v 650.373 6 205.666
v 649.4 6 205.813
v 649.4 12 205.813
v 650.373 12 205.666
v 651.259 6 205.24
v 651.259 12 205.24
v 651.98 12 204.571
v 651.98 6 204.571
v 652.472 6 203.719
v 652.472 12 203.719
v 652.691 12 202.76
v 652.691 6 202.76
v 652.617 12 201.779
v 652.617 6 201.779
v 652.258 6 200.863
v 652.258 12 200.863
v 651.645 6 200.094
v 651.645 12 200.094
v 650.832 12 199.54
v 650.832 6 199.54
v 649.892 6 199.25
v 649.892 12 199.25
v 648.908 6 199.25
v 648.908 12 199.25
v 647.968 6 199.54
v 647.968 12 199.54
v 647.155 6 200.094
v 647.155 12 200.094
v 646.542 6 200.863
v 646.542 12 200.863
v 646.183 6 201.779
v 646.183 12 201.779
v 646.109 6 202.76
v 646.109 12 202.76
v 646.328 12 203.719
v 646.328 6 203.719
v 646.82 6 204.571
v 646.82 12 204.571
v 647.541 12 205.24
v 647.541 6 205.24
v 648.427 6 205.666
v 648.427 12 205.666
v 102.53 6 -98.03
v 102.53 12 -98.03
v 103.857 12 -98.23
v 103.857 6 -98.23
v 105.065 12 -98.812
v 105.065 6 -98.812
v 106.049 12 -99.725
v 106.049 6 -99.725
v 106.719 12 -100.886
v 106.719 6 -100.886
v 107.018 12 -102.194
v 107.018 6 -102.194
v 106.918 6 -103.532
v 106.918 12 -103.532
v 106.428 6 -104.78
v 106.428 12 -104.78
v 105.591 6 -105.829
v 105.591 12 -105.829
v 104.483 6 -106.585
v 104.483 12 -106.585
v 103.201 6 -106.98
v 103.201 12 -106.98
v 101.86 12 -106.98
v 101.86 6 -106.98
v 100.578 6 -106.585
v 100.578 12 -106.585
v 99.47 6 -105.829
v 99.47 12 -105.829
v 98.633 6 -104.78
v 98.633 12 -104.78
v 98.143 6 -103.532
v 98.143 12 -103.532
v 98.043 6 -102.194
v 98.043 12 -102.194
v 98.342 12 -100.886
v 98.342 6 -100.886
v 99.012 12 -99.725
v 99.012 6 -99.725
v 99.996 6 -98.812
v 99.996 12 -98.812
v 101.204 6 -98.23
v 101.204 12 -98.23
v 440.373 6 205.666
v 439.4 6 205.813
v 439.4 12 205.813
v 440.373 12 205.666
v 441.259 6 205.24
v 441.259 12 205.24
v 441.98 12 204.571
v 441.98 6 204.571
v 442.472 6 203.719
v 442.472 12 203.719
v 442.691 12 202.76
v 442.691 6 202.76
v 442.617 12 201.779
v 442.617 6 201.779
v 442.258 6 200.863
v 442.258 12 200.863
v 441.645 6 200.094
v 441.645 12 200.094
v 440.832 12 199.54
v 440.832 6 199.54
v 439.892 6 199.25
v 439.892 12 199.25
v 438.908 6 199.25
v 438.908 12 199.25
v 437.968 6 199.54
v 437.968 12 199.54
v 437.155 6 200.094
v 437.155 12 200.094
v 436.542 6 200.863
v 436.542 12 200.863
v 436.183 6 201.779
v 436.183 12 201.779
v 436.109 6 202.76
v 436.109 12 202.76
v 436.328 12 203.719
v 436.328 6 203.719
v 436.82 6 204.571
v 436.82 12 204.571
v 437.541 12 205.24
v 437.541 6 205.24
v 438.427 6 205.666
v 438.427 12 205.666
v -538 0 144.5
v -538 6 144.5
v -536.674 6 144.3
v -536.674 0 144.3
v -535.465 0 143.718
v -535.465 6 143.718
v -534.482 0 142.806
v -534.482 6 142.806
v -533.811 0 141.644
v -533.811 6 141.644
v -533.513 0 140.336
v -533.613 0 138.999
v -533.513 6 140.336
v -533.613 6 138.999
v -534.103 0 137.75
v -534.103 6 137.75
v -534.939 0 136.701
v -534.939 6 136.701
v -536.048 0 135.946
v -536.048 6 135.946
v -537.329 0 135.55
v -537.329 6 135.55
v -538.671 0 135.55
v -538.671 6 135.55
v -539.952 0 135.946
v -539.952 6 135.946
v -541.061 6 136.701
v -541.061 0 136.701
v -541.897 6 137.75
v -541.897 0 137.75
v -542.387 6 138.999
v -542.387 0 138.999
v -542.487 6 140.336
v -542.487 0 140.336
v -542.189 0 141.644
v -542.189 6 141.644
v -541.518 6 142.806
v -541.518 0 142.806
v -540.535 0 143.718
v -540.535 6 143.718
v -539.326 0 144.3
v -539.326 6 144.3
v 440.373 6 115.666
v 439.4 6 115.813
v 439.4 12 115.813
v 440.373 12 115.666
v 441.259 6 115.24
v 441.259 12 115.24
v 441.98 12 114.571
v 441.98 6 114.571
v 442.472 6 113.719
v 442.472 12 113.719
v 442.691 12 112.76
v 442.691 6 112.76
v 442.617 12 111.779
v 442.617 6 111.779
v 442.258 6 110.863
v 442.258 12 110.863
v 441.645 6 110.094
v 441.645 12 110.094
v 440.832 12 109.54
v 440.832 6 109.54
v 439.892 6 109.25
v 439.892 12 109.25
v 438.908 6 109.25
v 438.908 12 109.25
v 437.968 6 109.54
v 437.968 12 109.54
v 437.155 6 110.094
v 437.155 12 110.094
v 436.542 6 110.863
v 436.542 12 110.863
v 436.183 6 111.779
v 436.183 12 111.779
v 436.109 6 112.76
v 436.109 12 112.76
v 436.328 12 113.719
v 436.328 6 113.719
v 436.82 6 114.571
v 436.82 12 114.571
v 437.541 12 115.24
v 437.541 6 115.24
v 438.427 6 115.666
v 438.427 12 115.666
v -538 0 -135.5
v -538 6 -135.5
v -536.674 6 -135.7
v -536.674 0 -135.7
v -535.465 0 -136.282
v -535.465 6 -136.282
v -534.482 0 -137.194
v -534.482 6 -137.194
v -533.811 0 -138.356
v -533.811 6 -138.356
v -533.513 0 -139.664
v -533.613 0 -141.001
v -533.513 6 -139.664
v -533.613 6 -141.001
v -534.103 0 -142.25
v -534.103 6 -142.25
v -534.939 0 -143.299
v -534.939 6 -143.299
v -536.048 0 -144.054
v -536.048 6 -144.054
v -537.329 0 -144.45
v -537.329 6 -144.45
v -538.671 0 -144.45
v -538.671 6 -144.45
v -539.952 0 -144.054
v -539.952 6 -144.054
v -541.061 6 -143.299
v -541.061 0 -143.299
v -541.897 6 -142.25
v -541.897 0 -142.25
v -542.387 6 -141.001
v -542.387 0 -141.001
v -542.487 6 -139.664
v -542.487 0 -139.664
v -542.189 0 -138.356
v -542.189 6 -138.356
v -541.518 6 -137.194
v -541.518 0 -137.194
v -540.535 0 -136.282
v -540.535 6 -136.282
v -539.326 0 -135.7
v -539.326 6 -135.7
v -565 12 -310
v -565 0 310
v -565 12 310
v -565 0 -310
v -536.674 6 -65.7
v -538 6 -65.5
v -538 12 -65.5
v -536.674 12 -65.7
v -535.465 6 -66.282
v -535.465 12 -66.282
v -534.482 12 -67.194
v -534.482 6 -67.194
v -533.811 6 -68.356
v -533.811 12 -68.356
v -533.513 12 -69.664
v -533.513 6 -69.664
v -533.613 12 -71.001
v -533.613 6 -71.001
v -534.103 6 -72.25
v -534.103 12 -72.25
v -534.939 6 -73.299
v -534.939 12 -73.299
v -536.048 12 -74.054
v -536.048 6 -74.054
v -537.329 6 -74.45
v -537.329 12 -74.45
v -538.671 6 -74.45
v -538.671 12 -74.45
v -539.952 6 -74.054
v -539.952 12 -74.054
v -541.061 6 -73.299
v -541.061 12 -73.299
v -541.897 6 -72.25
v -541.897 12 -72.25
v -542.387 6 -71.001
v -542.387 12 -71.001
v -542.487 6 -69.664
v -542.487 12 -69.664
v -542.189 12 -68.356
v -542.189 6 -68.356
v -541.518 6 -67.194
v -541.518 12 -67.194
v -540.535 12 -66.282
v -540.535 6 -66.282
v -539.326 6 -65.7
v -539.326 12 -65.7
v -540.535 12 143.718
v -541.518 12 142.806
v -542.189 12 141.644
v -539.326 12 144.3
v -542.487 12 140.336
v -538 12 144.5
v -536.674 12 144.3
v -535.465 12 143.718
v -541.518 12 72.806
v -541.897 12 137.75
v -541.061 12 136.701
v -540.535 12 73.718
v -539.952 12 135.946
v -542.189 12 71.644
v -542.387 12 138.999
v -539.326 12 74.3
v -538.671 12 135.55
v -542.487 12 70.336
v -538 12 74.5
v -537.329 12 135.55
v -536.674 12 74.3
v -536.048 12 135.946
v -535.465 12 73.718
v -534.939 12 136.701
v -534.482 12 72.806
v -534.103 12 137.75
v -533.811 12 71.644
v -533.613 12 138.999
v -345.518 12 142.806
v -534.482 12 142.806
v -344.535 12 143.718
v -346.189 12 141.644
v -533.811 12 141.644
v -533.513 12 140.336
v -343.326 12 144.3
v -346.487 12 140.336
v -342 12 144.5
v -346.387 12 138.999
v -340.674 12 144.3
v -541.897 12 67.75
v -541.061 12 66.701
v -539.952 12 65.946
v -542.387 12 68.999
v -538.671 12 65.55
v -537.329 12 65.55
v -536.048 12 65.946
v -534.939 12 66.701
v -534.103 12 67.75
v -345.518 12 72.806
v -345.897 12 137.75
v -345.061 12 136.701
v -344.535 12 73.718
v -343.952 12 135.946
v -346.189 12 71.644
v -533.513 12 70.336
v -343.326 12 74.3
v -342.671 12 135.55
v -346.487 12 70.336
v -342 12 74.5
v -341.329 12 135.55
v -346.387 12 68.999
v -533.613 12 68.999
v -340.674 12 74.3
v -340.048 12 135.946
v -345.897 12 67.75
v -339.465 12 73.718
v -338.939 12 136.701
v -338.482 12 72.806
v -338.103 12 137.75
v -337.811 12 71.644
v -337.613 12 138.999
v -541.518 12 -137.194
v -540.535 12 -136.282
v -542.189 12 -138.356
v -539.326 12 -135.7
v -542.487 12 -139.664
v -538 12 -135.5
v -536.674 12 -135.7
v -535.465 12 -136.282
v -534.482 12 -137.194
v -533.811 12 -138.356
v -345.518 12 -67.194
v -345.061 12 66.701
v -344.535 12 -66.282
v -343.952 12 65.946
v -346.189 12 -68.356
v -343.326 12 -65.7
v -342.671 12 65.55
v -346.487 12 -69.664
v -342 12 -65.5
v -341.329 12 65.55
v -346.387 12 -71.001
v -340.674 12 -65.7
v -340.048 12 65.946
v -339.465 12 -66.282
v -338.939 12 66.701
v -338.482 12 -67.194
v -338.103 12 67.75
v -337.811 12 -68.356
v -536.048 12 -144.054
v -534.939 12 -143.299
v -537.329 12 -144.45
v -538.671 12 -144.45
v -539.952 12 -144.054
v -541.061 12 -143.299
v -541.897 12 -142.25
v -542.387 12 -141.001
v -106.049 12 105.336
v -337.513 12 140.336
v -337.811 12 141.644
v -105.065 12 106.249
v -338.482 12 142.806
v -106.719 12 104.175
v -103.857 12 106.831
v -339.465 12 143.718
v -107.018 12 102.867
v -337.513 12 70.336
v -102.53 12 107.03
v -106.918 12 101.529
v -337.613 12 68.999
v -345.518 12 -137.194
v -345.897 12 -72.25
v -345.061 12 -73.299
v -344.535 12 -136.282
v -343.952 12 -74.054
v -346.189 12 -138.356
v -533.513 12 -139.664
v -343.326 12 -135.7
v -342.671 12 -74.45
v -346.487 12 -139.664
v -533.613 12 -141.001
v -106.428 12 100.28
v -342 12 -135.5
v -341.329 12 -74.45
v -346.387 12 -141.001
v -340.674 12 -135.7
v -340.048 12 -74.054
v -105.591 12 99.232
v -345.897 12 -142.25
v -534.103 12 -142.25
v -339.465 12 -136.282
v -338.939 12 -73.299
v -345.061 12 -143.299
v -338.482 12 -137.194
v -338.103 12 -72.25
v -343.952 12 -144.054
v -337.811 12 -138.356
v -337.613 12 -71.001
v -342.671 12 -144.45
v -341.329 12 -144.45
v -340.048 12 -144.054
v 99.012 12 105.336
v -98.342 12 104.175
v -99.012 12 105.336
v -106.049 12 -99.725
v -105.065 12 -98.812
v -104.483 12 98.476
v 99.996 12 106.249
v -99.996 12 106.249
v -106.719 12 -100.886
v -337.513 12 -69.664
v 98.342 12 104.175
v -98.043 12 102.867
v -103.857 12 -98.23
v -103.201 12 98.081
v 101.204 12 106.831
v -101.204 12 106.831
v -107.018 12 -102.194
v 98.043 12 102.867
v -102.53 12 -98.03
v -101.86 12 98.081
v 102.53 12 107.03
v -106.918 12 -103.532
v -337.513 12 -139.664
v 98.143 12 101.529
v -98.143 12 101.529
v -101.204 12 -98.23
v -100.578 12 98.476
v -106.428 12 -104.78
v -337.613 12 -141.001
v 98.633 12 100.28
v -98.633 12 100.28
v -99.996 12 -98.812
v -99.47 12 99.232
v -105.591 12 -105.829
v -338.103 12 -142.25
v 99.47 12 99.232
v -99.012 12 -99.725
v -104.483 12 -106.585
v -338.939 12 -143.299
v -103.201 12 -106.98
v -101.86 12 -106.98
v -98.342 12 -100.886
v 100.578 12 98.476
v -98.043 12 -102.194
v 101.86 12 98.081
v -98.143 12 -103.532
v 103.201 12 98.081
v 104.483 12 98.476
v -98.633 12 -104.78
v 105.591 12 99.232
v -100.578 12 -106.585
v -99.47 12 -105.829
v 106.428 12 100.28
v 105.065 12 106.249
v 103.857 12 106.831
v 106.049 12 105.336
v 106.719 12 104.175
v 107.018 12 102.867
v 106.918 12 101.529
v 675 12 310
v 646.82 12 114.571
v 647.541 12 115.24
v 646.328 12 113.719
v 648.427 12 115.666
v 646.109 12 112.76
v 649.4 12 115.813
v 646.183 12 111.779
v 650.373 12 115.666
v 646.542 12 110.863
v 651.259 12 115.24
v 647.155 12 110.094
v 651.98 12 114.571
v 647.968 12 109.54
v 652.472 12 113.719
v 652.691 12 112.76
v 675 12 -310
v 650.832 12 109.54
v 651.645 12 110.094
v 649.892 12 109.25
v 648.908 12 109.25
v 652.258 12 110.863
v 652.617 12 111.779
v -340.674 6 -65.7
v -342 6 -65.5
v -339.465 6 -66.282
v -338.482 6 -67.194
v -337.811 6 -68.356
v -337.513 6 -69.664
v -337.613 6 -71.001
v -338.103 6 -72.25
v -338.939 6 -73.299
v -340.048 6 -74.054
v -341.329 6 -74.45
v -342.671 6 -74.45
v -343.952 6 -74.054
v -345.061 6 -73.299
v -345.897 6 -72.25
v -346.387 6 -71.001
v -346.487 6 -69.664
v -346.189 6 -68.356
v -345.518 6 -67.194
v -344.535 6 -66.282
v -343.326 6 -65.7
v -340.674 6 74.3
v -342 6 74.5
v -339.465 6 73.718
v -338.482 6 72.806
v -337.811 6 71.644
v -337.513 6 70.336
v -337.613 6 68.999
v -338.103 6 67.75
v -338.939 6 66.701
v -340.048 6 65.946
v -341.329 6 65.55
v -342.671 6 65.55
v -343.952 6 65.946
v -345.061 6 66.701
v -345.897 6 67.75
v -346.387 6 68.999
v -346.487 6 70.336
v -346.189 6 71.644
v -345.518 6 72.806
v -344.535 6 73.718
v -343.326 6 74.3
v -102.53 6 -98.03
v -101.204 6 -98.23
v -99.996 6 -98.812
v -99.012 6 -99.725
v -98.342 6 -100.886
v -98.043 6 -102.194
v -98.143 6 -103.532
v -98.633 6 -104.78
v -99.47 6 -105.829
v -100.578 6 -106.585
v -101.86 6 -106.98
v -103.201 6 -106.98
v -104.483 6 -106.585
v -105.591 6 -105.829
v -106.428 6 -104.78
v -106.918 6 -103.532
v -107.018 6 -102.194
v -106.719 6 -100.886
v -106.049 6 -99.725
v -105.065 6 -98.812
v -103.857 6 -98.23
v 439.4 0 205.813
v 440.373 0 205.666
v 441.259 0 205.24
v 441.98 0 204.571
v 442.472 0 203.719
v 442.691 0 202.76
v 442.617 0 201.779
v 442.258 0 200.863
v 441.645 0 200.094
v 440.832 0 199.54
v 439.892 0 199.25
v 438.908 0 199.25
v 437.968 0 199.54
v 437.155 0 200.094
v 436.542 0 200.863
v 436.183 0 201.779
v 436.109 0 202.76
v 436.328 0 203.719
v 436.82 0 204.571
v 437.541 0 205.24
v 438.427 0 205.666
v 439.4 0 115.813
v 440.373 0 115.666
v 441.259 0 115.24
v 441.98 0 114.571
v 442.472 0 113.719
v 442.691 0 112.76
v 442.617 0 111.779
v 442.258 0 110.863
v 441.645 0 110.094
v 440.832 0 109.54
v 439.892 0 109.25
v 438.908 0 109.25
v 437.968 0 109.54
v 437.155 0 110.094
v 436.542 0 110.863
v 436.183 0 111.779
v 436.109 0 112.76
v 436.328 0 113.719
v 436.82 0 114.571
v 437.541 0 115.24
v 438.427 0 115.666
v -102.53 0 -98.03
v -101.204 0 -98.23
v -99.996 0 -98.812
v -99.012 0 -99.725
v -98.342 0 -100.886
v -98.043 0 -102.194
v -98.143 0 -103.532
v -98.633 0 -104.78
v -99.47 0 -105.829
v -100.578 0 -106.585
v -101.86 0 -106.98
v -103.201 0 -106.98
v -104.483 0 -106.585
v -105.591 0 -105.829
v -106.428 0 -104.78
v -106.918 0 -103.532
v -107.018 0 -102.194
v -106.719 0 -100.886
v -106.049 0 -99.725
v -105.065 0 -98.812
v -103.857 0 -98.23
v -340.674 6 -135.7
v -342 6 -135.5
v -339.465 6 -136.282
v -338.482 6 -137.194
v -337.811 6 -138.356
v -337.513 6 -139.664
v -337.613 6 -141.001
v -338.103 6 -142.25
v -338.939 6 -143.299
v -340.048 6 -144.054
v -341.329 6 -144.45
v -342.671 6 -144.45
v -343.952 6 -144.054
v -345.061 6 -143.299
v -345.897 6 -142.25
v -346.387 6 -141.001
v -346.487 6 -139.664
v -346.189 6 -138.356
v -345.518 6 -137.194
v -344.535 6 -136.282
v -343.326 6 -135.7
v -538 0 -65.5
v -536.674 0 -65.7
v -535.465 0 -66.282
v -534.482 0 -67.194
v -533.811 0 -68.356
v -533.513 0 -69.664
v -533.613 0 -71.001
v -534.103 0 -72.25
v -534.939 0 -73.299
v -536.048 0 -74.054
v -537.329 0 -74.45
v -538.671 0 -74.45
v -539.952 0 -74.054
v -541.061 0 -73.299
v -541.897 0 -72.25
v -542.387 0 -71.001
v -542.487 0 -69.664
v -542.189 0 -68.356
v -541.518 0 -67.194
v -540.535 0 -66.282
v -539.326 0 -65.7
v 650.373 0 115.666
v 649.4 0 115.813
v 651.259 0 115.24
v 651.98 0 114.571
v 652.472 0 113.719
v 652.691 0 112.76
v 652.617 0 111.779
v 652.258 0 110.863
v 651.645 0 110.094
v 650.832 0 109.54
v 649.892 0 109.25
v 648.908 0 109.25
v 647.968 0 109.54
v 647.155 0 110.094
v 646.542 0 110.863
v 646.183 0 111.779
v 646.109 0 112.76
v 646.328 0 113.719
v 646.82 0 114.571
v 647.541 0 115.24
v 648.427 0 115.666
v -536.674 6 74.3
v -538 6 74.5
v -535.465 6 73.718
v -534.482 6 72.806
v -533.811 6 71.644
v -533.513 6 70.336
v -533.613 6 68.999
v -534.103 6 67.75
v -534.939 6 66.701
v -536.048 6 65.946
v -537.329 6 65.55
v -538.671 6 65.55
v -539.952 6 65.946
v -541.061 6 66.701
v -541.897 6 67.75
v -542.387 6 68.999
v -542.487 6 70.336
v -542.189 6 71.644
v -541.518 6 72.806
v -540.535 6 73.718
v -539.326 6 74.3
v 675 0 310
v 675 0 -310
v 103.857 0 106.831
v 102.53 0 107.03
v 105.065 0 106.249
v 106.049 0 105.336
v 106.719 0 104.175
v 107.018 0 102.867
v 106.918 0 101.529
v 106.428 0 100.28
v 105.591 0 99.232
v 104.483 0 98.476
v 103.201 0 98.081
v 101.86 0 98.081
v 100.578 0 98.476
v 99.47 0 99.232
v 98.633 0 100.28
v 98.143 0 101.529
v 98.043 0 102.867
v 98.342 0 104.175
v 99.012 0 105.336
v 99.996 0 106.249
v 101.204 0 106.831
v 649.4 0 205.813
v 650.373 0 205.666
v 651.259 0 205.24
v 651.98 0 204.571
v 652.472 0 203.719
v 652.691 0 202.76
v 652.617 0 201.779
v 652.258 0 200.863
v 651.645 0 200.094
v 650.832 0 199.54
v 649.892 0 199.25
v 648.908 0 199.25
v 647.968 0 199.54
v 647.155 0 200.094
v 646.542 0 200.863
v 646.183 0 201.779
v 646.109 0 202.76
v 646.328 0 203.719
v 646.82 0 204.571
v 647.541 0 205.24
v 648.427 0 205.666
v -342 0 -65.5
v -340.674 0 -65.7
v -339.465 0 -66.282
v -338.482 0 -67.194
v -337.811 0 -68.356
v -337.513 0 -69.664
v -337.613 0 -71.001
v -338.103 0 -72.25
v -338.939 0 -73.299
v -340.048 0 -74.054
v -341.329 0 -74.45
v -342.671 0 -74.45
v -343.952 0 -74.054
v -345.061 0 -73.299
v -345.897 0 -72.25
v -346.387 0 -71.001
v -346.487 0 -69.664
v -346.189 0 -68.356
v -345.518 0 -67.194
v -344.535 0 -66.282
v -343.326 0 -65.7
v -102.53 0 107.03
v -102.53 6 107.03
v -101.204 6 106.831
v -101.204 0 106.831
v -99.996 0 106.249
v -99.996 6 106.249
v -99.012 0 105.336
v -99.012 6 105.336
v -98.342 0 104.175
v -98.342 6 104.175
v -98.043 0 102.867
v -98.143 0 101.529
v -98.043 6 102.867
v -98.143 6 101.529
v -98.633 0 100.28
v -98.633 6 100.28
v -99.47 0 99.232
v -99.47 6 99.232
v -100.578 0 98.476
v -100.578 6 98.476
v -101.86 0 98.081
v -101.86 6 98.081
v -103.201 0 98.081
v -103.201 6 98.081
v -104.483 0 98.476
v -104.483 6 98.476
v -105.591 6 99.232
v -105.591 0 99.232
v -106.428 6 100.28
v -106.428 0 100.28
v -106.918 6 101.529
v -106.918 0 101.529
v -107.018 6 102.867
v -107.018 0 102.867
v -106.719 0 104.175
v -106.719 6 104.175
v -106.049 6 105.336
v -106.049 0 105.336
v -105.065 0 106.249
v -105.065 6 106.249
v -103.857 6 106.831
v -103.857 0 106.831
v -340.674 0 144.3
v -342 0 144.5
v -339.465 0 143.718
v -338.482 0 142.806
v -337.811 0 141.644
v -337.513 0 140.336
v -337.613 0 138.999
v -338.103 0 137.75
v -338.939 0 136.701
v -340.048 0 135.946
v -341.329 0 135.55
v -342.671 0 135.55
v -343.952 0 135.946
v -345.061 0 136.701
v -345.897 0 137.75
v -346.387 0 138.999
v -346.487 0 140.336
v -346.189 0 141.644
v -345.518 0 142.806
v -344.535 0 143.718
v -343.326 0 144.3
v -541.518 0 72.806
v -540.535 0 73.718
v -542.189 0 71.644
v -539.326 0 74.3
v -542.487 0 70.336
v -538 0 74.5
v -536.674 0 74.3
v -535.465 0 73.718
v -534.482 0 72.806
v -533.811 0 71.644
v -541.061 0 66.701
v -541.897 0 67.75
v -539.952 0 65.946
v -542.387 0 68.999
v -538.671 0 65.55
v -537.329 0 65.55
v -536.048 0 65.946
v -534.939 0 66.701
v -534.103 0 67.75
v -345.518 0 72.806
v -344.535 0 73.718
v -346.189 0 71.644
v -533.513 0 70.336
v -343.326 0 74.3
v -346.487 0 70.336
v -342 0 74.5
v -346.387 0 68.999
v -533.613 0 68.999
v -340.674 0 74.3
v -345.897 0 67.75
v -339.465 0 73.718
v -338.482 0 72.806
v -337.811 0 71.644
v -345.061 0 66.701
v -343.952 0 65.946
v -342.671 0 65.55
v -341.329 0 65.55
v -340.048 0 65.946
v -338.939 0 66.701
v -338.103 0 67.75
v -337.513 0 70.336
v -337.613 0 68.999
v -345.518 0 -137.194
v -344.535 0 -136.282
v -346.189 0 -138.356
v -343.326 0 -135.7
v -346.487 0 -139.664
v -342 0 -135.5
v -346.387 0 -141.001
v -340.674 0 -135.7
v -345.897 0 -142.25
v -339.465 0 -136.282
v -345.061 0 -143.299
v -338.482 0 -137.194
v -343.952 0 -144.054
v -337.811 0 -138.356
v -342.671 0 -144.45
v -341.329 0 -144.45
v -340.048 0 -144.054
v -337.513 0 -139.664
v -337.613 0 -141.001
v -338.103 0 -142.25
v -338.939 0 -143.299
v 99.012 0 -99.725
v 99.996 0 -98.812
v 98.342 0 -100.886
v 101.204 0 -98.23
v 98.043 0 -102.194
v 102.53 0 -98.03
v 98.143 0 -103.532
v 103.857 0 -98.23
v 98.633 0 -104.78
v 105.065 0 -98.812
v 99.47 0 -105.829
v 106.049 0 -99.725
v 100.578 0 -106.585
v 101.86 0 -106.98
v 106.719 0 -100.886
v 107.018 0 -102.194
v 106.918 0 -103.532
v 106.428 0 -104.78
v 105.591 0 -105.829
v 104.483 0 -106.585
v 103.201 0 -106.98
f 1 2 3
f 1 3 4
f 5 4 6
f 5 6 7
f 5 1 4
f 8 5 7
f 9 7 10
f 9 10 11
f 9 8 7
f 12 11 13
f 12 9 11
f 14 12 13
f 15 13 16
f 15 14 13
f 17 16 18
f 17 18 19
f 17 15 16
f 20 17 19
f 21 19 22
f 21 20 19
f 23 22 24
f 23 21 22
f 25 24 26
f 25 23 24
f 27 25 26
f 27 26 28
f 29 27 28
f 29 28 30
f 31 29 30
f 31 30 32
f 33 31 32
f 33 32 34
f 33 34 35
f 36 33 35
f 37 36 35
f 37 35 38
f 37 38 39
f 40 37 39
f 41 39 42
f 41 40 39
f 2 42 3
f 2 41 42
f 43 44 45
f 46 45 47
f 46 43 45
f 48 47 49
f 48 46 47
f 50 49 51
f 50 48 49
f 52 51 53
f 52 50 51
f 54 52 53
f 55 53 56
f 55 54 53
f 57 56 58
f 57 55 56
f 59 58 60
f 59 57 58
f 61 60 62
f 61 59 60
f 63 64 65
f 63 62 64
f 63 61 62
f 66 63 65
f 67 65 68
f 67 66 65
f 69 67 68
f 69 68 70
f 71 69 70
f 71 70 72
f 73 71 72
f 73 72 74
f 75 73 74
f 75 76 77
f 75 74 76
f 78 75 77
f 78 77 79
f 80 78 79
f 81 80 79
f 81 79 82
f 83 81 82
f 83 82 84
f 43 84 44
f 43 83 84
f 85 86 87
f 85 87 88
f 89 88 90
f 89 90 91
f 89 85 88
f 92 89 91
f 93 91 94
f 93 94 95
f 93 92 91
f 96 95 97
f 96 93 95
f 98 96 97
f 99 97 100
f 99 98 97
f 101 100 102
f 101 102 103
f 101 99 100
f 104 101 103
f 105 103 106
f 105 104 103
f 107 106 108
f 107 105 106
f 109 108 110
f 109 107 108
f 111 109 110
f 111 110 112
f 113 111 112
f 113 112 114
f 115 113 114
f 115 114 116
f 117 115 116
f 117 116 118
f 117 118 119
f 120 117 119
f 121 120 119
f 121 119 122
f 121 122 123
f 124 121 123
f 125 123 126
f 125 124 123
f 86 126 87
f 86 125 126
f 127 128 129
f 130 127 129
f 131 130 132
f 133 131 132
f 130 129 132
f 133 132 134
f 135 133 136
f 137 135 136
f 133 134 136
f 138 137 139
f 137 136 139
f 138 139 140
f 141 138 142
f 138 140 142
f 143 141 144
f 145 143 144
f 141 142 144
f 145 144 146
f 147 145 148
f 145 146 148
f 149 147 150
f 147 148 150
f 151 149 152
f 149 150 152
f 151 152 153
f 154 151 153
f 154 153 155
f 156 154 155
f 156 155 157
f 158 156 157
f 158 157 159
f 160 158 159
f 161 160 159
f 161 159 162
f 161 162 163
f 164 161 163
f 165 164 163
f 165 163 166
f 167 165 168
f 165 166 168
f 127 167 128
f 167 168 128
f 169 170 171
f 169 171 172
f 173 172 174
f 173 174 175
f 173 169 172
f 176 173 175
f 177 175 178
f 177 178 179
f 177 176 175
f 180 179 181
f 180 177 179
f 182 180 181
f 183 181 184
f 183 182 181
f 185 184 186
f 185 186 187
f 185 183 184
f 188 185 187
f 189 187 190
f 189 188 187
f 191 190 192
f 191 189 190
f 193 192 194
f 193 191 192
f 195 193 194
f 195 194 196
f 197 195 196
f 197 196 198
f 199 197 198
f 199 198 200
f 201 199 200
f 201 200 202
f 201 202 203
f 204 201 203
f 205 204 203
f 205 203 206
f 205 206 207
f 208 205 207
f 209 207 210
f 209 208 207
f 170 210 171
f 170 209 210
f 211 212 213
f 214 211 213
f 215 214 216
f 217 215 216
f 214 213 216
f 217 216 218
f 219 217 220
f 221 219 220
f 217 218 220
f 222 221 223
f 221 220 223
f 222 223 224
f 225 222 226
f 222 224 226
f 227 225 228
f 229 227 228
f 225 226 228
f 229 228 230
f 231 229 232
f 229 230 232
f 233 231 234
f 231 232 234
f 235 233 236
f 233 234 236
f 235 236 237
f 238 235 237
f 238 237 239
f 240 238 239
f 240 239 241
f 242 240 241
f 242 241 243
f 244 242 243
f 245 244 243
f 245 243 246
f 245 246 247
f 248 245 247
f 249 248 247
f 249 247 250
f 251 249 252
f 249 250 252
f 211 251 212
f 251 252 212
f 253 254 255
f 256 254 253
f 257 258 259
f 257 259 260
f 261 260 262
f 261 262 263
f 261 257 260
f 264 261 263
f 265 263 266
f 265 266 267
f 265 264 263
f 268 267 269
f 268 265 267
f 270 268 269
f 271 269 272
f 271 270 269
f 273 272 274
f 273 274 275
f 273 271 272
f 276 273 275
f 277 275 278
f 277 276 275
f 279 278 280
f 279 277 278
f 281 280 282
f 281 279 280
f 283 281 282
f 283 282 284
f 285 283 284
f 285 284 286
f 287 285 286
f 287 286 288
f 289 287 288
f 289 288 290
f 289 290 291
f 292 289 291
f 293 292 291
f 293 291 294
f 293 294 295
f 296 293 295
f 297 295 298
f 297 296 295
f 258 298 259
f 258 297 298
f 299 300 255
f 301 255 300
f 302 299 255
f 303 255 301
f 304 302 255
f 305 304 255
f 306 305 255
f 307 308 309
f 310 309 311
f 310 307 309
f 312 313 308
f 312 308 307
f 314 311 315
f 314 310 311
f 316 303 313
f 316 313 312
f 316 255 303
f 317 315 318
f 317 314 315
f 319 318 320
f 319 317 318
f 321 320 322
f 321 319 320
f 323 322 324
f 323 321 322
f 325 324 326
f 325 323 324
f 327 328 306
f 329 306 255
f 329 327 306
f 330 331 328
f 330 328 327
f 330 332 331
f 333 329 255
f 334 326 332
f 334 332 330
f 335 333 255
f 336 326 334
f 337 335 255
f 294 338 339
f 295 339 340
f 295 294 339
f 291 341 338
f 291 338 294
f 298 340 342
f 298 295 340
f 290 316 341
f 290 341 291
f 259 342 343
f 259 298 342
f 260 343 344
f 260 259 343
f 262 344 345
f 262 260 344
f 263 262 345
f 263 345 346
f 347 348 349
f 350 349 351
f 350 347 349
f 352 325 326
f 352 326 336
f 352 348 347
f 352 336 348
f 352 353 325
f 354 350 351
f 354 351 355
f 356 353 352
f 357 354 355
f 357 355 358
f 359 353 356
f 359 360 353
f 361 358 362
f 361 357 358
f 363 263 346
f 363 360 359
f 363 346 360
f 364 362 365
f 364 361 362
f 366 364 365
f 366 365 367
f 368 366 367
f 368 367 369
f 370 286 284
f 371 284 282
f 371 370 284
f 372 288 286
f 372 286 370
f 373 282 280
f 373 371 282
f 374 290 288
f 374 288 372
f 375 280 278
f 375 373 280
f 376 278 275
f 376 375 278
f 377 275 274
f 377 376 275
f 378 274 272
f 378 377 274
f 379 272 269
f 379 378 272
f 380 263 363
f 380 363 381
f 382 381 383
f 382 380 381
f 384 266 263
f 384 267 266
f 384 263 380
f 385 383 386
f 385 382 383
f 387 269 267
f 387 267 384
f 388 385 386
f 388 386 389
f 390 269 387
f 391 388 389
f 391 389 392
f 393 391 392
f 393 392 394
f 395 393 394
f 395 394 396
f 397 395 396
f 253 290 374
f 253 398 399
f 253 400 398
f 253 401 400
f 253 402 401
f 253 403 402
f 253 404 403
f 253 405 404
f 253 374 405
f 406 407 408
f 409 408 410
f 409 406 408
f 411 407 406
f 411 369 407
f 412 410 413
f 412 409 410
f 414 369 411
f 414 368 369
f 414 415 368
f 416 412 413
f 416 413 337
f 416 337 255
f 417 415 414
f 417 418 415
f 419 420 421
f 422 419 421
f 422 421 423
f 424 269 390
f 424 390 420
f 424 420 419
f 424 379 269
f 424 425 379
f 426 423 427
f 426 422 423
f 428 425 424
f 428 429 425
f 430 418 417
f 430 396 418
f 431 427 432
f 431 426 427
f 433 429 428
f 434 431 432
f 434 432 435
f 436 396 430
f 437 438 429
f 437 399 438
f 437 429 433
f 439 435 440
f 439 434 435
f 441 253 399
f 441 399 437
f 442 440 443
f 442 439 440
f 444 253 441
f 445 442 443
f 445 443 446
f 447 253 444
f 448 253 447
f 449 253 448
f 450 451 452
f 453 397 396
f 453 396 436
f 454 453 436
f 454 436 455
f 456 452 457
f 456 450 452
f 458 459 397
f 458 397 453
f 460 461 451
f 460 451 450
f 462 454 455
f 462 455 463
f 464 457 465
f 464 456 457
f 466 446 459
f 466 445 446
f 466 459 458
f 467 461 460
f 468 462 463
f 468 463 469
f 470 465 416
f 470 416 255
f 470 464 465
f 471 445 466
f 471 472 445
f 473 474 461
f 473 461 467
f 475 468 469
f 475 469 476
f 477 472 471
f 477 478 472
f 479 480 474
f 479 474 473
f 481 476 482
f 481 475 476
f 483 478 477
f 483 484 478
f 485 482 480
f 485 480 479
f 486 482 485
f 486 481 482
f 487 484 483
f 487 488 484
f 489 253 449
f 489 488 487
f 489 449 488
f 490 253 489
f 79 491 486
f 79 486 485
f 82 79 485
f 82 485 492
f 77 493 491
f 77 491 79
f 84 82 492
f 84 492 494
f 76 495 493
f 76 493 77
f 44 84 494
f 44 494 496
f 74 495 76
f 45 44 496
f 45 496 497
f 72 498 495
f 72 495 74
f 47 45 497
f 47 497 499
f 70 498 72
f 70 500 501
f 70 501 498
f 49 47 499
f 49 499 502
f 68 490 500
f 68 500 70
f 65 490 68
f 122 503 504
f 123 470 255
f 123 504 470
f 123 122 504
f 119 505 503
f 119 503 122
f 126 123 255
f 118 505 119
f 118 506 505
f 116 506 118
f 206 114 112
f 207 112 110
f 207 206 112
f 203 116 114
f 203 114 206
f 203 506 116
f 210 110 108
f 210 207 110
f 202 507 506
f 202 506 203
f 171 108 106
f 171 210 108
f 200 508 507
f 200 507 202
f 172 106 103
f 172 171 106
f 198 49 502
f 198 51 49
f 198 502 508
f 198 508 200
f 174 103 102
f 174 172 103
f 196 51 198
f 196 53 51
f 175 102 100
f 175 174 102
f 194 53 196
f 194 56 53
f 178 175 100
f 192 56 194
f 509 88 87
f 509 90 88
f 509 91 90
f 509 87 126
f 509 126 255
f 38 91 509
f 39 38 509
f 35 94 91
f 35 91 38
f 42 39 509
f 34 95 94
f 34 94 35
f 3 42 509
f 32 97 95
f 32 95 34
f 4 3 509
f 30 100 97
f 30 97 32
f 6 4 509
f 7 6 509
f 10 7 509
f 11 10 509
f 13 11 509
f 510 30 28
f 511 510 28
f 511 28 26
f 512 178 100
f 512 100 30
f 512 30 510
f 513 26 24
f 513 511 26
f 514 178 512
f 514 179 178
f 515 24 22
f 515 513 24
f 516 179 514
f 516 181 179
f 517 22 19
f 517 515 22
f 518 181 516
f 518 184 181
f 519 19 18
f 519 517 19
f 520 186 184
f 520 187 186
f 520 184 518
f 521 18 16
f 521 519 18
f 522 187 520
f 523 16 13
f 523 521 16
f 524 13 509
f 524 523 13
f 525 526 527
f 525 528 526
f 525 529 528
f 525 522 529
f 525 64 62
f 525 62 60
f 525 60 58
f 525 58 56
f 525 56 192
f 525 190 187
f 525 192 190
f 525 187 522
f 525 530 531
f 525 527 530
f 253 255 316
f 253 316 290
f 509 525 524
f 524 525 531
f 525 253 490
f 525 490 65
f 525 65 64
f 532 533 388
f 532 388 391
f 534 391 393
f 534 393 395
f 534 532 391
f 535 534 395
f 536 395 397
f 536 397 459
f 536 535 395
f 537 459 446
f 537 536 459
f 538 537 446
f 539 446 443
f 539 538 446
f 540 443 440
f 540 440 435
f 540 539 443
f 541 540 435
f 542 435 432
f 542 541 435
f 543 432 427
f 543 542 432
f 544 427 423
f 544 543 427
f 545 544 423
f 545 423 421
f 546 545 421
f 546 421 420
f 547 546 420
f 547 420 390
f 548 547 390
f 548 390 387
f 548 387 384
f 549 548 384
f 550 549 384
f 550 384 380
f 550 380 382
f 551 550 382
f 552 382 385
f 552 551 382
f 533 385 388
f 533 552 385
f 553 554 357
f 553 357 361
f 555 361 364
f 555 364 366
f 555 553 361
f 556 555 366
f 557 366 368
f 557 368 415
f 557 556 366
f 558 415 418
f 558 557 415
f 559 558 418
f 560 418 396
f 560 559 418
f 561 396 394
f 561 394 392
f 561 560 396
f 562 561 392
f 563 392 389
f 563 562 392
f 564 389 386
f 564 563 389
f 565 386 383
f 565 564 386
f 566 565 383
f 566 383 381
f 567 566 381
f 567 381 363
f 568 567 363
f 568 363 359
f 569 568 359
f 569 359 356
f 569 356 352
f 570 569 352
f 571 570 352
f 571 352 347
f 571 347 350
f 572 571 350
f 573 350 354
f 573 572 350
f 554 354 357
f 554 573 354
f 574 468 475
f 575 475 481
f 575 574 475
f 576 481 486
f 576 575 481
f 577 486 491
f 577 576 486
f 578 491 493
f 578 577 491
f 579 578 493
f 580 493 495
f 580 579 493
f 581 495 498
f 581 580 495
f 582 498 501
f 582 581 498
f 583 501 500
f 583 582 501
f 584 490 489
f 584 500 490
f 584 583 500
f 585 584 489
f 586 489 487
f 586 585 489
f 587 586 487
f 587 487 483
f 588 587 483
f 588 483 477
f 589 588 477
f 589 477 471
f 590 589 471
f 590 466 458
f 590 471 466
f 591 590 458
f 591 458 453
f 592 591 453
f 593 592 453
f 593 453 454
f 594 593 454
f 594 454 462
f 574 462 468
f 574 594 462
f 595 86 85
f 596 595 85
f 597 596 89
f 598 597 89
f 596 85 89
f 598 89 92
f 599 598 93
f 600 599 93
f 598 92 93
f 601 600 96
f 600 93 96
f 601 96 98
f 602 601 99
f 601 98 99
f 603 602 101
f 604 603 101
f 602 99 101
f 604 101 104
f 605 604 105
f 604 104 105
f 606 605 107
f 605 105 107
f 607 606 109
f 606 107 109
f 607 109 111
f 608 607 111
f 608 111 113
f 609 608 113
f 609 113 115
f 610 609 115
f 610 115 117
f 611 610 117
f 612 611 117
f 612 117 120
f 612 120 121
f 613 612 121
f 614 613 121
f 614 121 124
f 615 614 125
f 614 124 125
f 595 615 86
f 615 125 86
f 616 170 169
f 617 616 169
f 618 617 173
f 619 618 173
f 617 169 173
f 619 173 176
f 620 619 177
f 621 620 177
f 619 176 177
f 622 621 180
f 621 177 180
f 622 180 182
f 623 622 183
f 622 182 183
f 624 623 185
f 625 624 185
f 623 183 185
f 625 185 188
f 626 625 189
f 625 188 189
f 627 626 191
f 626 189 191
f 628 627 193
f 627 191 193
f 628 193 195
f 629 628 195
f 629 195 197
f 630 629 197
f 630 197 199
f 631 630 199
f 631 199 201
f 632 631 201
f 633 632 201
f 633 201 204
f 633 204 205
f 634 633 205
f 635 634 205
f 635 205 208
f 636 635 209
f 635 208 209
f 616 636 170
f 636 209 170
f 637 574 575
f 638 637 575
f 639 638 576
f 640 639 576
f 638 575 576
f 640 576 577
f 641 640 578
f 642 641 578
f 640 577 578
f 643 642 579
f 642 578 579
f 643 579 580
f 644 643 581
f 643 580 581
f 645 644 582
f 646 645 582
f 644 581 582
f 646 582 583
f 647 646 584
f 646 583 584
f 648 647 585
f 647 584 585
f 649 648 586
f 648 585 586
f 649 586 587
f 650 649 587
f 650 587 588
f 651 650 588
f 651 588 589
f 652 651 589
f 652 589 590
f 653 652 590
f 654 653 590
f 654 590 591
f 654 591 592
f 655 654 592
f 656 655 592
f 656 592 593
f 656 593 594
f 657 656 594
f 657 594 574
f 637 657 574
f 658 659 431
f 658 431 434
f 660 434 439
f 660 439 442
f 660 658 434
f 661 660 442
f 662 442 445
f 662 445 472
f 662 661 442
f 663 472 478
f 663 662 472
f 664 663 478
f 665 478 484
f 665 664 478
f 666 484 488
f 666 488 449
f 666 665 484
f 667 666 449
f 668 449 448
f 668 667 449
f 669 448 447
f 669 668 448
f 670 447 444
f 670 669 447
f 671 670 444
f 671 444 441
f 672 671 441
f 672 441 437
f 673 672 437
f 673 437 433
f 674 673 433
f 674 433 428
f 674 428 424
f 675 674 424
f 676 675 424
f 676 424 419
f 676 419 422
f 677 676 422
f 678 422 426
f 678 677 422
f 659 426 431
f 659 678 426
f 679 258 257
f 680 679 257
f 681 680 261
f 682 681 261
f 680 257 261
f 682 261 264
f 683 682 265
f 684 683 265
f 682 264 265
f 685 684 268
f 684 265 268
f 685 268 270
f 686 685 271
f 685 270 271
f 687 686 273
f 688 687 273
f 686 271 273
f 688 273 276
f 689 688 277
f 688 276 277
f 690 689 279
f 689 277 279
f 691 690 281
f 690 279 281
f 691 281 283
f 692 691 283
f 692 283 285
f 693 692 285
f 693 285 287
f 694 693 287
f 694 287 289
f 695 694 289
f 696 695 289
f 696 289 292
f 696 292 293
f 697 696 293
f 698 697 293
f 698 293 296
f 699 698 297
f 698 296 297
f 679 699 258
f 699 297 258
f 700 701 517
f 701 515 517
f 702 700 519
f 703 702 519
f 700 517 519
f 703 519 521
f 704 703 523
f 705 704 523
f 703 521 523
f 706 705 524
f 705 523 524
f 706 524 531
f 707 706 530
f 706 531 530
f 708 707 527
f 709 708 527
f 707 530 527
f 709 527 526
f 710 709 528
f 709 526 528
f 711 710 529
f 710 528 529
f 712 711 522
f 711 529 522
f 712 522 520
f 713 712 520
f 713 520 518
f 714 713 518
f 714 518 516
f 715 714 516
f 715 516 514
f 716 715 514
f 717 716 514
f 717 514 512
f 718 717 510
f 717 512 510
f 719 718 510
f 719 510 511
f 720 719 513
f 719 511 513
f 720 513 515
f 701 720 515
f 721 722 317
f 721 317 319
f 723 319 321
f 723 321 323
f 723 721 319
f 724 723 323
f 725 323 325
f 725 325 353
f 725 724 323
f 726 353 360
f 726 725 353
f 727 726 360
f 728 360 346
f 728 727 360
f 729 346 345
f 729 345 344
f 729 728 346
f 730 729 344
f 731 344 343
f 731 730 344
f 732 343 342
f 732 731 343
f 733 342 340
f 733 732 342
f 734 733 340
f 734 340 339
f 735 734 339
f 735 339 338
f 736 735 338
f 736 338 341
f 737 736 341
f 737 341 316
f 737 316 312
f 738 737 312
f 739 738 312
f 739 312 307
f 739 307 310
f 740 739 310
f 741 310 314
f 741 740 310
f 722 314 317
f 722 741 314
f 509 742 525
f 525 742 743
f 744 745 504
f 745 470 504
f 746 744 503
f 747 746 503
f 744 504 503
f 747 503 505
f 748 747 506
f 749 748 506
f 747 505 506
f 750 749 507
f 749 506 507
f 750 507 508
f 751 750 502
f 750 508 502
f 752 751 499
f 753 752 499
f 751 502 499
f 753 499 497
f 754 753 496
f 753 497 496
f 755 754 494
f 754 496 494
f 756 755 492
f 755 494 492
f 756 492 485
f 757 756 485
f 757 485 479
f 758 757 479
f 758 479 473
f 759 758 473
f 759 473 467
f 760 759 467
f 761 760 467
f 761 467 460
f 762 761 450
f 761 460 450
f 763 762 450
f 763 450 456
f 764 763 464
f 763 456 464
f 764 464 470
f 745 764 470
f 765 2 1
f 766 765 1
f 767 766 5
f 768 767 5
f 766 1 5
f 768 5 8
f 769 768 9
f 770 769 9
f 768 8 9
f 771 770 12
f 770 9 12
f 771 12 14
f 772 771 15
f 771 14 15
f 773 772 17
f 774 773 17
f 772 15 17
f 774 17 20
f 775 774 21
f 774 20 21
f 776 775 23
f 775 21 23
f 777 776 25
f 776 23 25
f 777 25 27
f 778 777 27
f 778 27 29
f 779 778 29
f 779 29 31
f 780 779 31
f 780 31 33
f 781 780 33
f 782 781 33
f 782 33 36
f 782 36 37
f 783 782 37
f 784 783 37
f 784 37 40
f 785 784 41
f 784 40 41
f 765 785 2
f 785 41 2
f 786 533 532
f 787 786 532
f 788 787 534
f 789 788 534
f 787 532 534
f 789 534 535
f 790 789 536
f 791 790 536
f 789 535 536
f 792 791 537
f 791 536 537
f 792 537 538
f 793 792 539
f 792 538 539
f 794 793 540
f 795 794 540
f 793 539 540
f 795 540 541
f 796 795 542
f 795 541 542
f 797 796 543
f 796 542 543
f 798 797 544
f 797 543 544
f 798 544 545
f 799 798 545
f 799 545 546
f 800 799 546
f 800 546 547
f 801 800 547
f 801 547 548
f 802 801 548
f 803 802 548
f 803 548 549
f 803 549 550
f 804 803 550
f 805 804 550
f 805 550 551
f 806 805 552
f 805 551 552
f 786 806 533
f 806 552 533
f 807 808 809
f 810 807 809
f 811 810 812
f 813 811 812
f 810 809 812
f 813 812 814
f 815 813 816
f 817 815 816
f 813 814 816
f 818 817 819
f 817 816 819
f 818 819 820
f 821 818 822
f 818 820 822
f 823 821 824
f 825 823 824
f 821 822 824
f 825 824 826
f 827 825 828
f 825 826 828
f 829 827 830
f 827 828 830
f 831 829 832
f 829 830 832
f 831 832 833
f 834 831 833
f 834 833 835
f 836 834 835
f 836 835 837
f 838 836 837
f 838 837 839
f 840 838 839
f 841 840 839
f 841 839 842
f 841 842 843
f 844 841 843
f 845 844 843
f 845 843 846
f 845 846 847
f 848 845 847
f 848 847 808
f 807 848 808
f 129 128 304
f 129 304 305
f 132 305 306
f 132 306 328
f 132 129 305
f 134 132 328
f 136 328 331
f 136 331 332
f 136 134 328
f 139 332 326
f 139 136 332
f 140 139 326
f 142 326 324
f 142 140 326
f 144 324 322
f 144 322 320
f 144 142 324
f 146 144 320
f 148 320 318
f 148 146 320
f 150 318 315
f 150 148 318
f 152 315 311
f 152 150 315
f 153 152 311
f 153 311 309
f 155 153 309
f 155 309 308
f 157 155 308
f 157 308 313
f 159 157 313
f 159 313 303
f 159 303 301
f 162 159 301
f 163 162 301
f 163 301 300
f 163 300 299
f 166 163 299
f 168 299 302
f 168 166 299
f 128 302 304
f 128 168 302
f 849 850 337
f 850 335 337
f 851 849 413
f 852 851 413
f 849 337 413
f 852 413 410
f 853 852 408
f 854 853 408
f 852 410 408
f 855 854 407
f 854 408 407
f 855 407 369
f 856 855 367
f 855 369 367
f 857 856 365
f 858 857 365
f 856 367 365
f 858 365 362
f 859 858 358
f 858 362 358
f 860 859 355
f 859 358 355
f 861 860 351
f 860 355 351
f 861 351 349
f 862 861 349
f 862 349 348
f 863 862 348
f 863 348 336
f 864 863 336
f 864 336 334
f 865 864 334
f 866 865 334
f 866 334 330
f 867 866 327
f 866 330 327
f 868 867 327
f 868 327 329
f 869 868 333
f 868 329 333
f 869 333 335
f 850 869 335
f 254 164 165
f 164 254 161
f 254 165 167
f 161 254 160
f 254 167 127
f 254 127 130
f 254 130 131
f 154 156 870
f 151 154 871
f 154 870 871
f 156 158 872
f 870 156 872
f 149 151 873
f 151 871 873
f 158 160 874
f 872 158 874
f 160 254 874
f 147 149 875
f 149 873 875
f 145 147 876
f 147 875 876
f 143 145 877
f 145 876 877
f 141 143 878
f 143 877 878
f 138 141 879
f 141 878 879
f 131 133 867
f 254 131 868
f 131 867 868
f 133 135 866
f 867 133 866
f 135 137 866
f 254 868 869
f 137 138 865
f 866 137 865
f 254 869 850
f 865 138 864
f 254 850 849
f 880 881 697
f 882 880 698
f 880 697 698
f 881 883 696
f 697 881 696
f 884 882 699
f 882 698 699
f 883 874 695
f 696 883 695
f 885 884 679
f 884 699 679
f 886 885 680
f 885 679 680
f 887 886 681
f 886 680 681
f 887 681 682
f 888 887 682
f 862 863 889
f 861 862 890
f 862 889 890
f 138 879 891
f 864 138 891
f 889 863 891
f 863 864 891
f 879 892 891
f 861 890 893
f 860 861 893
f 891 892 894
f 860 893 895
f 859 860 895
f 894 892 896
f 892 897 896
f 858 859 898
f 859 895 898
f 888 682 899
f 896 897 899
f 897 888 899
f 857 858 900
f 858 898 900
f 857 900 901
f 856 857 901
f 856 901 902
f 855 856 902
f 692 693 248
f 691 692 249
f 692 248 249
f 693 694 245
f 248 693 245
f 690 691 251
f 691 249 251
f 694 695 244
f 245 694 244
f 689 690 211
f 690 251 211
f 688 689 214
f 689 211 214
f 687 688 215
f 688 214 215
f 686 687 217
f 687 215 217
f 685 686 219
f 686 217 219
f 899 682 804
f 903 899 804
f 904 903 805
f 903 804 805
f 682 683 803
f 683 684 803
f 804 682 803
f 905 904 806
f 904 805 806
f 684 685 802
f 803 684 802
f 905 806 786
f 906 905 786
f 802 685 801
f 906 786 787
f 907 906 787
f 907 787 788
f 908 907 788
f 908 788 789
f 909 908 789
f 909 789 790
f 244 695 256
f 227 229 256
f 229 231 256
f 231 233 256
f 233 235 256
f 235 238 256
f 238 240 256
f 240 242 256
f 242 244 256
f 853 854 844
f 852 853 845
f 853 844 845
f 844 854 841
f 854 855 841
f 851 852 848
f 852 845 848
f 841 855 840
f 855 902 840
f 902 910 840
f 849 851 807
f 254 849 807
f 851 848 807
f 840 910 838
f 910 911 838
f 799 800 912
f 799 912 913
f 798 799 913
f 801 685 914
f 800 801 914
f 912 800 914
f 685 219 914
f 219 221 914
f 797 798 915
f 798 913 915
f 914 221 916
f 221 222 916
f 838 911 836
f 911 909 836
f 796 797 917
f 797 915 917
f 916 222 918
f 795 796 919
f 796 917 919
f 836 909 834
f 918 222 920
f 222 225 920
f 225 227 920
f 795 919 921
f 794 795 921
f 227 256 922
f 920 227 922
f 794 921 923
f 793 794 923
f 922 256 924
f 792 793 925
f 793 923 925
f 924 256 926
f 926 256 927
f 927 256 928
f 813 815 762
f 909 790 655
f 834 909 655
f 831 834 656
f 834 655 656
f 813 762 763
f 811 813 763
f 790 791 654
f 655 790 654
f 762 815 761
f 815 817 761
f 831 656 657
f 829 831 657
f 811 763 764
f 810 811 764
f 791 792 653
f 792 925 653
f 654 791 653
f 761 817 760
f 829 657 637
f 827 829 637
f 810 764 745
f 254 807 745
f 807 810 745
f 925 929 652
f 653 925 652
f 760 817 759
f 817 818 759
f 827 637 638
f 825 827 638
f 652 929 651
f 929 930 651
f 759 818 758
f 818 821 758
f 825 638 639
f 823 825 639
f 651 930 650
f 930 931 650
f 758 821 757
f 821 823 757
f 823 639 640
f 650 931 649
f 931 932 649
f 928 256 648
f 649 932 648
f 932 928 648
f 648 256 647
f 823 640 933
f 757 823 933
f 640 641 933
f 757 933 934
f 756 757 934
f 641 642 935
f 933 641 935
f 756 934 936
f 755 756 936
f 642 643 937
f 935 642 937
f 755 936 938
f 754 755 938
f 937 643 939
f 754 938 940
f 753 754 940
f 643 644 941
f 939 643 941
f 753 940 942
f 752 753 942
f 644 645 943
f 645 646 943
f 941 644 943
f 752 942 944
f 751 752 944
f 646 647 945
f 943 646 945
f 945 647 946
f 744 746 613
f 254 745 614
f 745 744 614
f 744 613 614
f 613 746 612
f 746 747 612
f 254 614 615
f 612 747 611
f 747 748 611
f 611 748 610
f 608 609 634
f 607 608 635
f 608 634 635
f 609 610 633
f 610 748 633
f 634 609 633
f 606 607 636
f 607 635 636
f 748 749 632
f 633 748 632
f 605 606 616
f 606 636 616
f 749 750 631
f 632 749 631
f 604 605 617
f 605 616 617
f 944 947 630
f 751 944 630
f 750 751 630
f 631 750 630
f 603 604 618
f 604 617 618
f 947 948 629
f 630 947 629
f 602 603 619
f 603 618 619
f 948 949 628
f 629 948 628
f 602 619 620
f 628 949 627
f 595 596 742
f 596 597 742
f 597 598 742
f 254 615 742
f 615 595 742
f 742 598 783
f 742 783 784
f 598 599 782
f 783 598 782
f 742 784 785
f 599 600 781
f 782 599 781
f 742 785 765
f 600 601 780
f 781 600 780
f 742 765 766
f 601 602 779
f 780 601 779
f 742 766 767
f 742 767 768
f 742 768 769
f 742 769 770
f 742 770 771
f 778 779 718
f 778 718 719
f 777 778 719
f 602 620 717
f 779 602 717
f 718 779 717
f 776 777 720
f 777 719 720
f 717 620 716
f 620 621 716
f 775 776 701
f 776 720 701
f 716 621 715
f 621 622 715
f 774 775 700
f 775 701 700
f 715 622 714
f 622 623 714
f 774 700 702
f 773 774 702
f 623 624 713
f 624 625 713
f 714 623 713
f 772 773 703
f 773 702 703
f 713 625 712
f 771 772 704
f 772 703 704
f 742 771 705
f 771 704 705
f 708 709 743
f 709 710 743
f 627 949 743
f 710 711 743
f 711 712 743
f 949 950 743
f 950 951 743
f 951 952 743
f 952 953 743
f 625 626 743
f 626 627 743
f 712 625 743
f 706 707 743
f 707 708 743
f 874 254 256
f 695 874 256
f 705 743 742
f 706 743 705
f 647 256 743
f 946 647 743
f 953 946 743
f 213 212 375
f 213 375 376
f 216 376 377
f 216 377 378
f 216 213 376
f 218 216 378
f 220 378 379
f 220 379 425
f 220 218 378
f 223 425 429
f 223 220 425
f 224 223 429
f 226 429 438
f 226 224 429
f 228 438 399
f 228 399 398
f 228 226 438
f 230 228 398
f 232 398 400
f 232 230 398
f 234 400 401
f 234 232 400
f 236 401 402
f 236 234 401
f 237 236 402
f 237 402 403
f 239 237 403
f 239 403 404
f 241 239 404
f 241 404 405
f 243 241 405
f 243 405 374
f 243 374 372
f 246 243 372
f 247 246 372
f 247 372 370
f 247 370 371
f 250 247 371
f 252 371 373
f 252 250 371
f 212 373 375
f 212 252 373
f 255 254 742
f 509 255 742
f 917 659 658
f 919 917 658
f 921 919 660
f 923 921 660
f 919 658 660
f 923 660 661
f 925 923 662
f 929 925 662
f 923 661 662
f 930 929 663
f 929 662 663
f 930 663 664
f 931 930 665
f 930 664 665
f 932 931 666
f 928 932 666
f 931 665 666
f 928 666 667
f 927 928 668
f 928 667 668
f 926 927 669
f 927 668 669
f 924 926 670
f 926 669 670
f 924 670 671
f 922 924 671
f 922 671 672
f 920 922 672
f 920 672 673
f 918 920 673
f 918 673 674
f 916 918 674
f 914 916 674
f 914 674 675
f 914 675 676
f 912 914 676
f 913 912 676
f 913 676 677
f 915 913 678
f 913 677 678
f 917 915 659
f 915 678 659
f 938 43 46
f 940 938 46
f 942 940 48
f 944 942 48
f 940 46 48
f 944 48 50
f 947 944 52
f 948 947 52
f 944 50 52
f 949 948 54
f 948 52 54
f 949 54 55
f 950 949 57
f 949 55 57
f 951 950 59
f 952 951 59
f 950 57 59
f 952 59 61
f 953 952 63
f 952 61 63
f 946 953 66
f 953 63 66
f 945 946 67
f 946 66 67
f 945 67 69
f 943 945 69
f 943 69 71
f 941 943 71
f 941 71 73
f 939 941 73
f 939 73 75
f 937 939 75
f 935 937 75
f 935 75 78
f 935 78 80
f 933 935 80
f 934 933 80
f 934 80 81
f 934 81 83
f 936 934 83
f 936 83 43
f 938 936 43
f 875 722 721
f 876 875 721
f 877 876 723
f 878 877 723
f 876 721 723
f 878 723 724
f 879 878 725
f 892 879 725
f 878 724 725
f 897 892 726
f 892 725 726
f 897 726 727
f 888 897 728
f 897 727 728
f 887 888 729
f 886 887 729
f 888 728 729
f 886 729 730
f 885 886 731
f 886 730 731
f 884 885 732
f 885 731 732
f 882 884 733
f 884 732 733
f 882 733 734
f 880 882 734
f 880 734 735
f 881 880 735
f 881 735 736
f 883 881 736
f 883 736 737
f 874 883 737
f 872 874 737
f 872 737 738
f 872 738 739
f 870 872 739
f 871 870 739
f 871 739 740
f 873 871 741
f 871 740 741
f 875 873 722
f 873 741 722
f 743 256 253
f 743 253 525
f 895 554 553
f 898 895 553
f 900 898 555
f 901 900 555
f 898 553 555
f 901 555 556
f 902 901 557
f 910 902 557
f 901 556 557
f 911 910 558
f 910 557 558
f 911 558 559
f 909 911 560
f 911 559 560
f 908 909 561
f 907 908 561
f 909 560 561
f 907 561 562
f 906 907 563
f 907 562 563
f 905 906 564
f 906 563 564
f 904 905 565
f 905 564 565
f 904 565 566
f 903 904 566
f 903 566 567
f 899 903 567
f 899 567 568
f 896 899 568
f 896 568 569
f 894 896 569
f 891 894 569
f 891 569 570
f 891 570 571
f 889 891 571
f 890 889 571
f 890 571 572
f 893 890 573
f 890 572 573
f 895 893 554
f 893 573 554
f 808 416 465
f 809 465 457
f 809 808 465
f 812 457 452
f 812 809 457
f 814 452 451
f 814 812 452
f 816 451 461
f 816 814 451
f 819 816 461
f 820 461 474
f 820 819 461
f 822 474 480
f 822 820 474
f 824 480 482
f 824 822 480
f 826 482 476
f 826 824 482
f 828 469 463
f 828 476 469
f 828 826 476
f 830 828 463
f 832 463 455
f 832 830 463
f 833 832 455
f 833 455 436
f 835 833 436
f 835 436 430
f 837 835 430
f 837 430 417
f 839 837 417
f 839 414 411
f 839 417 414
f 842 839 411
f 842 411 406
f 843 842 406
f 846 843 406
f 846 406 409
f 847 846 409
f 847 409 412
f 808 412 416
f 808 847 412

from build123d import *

# Parameters (mm, degrees)
SKETCH_1_W                     = 1240
SKETCH_1_H                     = 620
EXTRUDE_1_DEPTH                = 12
HOPPER_START                   = 6
SKETCH_2_R                     = 4.5
HOPPER_FRAME_HOLES_DEPTH       = 6
DRIVE_START                    = 6
SKETCH_3_R                     = 4.5
DRIVE_MOUNTING_HOLES_DEPTH     = 14
HOLDER_START                   = 6
HOLDER_MOUNTING_HOLES_LAYOUT_R = 3.3
HOLDER_MOUNTING_HOLES_DEPTH    = 6


with BuildPart() as part:
    # 草图1 → 凸台-拉伸1 (new body)
    with BuildSketch(Plane(origin=(0, 0, 0), x_dir=(1, 0, 0), z_dir=(0, 1, 0))):
        with Locations((55, 0)):
            Rectangle(SKETCH_1_W, SKETCH_1_H)
    extrude(amount=EXTRUDE_1_DEPTH)

    # 草图2 → Hopper Frame Holes (cut, symmetric)
    with BuildSketch(Plane(origin=(0, 0, 0), x_dir=(1, 0, 0), z_dir=(0, 1, 0)).offset(HOPPER_START)):
        with Locations(Location((-538, 140, 0), (0, 0, 270))):
            Circle(SKETCH_2_R)
        with Locations(Location((-538, 70, 0), (0, 0, 270))):
            Circle(SKETCH_2_R)
        with Locations(Location((-538, -70, 0), (0, 0, 270))):
            Circle(SKETCH_2_R)
        with Locations(Location((-538, -140, 0), (0, 0, 270))):
            Circle(SKETCH_2_R)
        with Locations(Location((-342, 140, 0), (0, 0, 270))):
            Circle(SKETCH_2_R)
        with Locations(Location((-342, 70, 0), (0, 0, 270))):
            Circle(SKETCH_2_R)
        with Locations(Location((-342, -70, 0), (0, 0, 270))):
            Circle(SKETCH_2_R)
        with Locations(Location((-342, -140, 0), (0, 0, 270))):
            Circle(SKETCH_2_R)
    extrude(amount=HOPPER_FRAME_HOLES_DEPTH, both=True, mode=Mode.SUBTRACT)

    # 草图3 → Drive Mounting Holes (cut, symmetric)
    with BuildSketch(Plane(origin=(0, 0, 0), x_dir=(1, 0, 0), z_dir=(0, 1, 0)).offset(DRIVE_START)):
        with Locations(Location((102.530483272, 102.530483272, 0), (0, 0, 270))):
            Circle(SKETCH_3_R)
        with Locations(Location((-102.530483272, 102.530483272, 0), (0, 0, 270))):
            Circle(SKETCH_3_R)
        with Locations(Location((-102.530483272, -102.530483272, 0), (0, 0, 270))):
            Circle(SKETCH_3_R)
        with Locations(Location((102.530483272, -102.530483272, 0), (0, 0, 270))):
            Circle(SKETCH_3_R)
    extrude(amount=DRIVE_MOUNTING_HOLES_DEPTH, both=True, mode=Mode.SUBTRACT)

    # Holder Mounting Holes Layout → Holder Mounting Holes (cut, symmetric)
    with BuildSketch(Plane(origin=(0, 0, 0), x_dir=(1, 0, 0), z_dir=(0, 1, 0)).offset(HOLDER_START)):
        with Locations(Location((439.4, -202.513078806, 0), (0, 0, 270))):
            Circle(HOLDER_MOUNTING_HOLES_LAYOUT_R)
        with Locations(Location((649.4, -202.513078806, 0), (0, 0, 270))):
            Circle(HOLDER_MOUNTING_HOLES_LAYOUT_R)
        with Locations(Location((439.4, -112.513078806, 0), (0, 0, 270))):
            Circle(HOLDER_MOUNTING_HOLES_LAYOUT_R)
        with Locations(Location((649.4, -112.513078806, 0), (0, 0, 270))):
            Circle(HOLDER_MOUNTING_HOLES_LAYOUT_R)
    extrude(amount=HOLDER_MOUNTING_HOLES_DEPTH, both=True, mode=Mode.SUBTRACT)


solid = part.part
